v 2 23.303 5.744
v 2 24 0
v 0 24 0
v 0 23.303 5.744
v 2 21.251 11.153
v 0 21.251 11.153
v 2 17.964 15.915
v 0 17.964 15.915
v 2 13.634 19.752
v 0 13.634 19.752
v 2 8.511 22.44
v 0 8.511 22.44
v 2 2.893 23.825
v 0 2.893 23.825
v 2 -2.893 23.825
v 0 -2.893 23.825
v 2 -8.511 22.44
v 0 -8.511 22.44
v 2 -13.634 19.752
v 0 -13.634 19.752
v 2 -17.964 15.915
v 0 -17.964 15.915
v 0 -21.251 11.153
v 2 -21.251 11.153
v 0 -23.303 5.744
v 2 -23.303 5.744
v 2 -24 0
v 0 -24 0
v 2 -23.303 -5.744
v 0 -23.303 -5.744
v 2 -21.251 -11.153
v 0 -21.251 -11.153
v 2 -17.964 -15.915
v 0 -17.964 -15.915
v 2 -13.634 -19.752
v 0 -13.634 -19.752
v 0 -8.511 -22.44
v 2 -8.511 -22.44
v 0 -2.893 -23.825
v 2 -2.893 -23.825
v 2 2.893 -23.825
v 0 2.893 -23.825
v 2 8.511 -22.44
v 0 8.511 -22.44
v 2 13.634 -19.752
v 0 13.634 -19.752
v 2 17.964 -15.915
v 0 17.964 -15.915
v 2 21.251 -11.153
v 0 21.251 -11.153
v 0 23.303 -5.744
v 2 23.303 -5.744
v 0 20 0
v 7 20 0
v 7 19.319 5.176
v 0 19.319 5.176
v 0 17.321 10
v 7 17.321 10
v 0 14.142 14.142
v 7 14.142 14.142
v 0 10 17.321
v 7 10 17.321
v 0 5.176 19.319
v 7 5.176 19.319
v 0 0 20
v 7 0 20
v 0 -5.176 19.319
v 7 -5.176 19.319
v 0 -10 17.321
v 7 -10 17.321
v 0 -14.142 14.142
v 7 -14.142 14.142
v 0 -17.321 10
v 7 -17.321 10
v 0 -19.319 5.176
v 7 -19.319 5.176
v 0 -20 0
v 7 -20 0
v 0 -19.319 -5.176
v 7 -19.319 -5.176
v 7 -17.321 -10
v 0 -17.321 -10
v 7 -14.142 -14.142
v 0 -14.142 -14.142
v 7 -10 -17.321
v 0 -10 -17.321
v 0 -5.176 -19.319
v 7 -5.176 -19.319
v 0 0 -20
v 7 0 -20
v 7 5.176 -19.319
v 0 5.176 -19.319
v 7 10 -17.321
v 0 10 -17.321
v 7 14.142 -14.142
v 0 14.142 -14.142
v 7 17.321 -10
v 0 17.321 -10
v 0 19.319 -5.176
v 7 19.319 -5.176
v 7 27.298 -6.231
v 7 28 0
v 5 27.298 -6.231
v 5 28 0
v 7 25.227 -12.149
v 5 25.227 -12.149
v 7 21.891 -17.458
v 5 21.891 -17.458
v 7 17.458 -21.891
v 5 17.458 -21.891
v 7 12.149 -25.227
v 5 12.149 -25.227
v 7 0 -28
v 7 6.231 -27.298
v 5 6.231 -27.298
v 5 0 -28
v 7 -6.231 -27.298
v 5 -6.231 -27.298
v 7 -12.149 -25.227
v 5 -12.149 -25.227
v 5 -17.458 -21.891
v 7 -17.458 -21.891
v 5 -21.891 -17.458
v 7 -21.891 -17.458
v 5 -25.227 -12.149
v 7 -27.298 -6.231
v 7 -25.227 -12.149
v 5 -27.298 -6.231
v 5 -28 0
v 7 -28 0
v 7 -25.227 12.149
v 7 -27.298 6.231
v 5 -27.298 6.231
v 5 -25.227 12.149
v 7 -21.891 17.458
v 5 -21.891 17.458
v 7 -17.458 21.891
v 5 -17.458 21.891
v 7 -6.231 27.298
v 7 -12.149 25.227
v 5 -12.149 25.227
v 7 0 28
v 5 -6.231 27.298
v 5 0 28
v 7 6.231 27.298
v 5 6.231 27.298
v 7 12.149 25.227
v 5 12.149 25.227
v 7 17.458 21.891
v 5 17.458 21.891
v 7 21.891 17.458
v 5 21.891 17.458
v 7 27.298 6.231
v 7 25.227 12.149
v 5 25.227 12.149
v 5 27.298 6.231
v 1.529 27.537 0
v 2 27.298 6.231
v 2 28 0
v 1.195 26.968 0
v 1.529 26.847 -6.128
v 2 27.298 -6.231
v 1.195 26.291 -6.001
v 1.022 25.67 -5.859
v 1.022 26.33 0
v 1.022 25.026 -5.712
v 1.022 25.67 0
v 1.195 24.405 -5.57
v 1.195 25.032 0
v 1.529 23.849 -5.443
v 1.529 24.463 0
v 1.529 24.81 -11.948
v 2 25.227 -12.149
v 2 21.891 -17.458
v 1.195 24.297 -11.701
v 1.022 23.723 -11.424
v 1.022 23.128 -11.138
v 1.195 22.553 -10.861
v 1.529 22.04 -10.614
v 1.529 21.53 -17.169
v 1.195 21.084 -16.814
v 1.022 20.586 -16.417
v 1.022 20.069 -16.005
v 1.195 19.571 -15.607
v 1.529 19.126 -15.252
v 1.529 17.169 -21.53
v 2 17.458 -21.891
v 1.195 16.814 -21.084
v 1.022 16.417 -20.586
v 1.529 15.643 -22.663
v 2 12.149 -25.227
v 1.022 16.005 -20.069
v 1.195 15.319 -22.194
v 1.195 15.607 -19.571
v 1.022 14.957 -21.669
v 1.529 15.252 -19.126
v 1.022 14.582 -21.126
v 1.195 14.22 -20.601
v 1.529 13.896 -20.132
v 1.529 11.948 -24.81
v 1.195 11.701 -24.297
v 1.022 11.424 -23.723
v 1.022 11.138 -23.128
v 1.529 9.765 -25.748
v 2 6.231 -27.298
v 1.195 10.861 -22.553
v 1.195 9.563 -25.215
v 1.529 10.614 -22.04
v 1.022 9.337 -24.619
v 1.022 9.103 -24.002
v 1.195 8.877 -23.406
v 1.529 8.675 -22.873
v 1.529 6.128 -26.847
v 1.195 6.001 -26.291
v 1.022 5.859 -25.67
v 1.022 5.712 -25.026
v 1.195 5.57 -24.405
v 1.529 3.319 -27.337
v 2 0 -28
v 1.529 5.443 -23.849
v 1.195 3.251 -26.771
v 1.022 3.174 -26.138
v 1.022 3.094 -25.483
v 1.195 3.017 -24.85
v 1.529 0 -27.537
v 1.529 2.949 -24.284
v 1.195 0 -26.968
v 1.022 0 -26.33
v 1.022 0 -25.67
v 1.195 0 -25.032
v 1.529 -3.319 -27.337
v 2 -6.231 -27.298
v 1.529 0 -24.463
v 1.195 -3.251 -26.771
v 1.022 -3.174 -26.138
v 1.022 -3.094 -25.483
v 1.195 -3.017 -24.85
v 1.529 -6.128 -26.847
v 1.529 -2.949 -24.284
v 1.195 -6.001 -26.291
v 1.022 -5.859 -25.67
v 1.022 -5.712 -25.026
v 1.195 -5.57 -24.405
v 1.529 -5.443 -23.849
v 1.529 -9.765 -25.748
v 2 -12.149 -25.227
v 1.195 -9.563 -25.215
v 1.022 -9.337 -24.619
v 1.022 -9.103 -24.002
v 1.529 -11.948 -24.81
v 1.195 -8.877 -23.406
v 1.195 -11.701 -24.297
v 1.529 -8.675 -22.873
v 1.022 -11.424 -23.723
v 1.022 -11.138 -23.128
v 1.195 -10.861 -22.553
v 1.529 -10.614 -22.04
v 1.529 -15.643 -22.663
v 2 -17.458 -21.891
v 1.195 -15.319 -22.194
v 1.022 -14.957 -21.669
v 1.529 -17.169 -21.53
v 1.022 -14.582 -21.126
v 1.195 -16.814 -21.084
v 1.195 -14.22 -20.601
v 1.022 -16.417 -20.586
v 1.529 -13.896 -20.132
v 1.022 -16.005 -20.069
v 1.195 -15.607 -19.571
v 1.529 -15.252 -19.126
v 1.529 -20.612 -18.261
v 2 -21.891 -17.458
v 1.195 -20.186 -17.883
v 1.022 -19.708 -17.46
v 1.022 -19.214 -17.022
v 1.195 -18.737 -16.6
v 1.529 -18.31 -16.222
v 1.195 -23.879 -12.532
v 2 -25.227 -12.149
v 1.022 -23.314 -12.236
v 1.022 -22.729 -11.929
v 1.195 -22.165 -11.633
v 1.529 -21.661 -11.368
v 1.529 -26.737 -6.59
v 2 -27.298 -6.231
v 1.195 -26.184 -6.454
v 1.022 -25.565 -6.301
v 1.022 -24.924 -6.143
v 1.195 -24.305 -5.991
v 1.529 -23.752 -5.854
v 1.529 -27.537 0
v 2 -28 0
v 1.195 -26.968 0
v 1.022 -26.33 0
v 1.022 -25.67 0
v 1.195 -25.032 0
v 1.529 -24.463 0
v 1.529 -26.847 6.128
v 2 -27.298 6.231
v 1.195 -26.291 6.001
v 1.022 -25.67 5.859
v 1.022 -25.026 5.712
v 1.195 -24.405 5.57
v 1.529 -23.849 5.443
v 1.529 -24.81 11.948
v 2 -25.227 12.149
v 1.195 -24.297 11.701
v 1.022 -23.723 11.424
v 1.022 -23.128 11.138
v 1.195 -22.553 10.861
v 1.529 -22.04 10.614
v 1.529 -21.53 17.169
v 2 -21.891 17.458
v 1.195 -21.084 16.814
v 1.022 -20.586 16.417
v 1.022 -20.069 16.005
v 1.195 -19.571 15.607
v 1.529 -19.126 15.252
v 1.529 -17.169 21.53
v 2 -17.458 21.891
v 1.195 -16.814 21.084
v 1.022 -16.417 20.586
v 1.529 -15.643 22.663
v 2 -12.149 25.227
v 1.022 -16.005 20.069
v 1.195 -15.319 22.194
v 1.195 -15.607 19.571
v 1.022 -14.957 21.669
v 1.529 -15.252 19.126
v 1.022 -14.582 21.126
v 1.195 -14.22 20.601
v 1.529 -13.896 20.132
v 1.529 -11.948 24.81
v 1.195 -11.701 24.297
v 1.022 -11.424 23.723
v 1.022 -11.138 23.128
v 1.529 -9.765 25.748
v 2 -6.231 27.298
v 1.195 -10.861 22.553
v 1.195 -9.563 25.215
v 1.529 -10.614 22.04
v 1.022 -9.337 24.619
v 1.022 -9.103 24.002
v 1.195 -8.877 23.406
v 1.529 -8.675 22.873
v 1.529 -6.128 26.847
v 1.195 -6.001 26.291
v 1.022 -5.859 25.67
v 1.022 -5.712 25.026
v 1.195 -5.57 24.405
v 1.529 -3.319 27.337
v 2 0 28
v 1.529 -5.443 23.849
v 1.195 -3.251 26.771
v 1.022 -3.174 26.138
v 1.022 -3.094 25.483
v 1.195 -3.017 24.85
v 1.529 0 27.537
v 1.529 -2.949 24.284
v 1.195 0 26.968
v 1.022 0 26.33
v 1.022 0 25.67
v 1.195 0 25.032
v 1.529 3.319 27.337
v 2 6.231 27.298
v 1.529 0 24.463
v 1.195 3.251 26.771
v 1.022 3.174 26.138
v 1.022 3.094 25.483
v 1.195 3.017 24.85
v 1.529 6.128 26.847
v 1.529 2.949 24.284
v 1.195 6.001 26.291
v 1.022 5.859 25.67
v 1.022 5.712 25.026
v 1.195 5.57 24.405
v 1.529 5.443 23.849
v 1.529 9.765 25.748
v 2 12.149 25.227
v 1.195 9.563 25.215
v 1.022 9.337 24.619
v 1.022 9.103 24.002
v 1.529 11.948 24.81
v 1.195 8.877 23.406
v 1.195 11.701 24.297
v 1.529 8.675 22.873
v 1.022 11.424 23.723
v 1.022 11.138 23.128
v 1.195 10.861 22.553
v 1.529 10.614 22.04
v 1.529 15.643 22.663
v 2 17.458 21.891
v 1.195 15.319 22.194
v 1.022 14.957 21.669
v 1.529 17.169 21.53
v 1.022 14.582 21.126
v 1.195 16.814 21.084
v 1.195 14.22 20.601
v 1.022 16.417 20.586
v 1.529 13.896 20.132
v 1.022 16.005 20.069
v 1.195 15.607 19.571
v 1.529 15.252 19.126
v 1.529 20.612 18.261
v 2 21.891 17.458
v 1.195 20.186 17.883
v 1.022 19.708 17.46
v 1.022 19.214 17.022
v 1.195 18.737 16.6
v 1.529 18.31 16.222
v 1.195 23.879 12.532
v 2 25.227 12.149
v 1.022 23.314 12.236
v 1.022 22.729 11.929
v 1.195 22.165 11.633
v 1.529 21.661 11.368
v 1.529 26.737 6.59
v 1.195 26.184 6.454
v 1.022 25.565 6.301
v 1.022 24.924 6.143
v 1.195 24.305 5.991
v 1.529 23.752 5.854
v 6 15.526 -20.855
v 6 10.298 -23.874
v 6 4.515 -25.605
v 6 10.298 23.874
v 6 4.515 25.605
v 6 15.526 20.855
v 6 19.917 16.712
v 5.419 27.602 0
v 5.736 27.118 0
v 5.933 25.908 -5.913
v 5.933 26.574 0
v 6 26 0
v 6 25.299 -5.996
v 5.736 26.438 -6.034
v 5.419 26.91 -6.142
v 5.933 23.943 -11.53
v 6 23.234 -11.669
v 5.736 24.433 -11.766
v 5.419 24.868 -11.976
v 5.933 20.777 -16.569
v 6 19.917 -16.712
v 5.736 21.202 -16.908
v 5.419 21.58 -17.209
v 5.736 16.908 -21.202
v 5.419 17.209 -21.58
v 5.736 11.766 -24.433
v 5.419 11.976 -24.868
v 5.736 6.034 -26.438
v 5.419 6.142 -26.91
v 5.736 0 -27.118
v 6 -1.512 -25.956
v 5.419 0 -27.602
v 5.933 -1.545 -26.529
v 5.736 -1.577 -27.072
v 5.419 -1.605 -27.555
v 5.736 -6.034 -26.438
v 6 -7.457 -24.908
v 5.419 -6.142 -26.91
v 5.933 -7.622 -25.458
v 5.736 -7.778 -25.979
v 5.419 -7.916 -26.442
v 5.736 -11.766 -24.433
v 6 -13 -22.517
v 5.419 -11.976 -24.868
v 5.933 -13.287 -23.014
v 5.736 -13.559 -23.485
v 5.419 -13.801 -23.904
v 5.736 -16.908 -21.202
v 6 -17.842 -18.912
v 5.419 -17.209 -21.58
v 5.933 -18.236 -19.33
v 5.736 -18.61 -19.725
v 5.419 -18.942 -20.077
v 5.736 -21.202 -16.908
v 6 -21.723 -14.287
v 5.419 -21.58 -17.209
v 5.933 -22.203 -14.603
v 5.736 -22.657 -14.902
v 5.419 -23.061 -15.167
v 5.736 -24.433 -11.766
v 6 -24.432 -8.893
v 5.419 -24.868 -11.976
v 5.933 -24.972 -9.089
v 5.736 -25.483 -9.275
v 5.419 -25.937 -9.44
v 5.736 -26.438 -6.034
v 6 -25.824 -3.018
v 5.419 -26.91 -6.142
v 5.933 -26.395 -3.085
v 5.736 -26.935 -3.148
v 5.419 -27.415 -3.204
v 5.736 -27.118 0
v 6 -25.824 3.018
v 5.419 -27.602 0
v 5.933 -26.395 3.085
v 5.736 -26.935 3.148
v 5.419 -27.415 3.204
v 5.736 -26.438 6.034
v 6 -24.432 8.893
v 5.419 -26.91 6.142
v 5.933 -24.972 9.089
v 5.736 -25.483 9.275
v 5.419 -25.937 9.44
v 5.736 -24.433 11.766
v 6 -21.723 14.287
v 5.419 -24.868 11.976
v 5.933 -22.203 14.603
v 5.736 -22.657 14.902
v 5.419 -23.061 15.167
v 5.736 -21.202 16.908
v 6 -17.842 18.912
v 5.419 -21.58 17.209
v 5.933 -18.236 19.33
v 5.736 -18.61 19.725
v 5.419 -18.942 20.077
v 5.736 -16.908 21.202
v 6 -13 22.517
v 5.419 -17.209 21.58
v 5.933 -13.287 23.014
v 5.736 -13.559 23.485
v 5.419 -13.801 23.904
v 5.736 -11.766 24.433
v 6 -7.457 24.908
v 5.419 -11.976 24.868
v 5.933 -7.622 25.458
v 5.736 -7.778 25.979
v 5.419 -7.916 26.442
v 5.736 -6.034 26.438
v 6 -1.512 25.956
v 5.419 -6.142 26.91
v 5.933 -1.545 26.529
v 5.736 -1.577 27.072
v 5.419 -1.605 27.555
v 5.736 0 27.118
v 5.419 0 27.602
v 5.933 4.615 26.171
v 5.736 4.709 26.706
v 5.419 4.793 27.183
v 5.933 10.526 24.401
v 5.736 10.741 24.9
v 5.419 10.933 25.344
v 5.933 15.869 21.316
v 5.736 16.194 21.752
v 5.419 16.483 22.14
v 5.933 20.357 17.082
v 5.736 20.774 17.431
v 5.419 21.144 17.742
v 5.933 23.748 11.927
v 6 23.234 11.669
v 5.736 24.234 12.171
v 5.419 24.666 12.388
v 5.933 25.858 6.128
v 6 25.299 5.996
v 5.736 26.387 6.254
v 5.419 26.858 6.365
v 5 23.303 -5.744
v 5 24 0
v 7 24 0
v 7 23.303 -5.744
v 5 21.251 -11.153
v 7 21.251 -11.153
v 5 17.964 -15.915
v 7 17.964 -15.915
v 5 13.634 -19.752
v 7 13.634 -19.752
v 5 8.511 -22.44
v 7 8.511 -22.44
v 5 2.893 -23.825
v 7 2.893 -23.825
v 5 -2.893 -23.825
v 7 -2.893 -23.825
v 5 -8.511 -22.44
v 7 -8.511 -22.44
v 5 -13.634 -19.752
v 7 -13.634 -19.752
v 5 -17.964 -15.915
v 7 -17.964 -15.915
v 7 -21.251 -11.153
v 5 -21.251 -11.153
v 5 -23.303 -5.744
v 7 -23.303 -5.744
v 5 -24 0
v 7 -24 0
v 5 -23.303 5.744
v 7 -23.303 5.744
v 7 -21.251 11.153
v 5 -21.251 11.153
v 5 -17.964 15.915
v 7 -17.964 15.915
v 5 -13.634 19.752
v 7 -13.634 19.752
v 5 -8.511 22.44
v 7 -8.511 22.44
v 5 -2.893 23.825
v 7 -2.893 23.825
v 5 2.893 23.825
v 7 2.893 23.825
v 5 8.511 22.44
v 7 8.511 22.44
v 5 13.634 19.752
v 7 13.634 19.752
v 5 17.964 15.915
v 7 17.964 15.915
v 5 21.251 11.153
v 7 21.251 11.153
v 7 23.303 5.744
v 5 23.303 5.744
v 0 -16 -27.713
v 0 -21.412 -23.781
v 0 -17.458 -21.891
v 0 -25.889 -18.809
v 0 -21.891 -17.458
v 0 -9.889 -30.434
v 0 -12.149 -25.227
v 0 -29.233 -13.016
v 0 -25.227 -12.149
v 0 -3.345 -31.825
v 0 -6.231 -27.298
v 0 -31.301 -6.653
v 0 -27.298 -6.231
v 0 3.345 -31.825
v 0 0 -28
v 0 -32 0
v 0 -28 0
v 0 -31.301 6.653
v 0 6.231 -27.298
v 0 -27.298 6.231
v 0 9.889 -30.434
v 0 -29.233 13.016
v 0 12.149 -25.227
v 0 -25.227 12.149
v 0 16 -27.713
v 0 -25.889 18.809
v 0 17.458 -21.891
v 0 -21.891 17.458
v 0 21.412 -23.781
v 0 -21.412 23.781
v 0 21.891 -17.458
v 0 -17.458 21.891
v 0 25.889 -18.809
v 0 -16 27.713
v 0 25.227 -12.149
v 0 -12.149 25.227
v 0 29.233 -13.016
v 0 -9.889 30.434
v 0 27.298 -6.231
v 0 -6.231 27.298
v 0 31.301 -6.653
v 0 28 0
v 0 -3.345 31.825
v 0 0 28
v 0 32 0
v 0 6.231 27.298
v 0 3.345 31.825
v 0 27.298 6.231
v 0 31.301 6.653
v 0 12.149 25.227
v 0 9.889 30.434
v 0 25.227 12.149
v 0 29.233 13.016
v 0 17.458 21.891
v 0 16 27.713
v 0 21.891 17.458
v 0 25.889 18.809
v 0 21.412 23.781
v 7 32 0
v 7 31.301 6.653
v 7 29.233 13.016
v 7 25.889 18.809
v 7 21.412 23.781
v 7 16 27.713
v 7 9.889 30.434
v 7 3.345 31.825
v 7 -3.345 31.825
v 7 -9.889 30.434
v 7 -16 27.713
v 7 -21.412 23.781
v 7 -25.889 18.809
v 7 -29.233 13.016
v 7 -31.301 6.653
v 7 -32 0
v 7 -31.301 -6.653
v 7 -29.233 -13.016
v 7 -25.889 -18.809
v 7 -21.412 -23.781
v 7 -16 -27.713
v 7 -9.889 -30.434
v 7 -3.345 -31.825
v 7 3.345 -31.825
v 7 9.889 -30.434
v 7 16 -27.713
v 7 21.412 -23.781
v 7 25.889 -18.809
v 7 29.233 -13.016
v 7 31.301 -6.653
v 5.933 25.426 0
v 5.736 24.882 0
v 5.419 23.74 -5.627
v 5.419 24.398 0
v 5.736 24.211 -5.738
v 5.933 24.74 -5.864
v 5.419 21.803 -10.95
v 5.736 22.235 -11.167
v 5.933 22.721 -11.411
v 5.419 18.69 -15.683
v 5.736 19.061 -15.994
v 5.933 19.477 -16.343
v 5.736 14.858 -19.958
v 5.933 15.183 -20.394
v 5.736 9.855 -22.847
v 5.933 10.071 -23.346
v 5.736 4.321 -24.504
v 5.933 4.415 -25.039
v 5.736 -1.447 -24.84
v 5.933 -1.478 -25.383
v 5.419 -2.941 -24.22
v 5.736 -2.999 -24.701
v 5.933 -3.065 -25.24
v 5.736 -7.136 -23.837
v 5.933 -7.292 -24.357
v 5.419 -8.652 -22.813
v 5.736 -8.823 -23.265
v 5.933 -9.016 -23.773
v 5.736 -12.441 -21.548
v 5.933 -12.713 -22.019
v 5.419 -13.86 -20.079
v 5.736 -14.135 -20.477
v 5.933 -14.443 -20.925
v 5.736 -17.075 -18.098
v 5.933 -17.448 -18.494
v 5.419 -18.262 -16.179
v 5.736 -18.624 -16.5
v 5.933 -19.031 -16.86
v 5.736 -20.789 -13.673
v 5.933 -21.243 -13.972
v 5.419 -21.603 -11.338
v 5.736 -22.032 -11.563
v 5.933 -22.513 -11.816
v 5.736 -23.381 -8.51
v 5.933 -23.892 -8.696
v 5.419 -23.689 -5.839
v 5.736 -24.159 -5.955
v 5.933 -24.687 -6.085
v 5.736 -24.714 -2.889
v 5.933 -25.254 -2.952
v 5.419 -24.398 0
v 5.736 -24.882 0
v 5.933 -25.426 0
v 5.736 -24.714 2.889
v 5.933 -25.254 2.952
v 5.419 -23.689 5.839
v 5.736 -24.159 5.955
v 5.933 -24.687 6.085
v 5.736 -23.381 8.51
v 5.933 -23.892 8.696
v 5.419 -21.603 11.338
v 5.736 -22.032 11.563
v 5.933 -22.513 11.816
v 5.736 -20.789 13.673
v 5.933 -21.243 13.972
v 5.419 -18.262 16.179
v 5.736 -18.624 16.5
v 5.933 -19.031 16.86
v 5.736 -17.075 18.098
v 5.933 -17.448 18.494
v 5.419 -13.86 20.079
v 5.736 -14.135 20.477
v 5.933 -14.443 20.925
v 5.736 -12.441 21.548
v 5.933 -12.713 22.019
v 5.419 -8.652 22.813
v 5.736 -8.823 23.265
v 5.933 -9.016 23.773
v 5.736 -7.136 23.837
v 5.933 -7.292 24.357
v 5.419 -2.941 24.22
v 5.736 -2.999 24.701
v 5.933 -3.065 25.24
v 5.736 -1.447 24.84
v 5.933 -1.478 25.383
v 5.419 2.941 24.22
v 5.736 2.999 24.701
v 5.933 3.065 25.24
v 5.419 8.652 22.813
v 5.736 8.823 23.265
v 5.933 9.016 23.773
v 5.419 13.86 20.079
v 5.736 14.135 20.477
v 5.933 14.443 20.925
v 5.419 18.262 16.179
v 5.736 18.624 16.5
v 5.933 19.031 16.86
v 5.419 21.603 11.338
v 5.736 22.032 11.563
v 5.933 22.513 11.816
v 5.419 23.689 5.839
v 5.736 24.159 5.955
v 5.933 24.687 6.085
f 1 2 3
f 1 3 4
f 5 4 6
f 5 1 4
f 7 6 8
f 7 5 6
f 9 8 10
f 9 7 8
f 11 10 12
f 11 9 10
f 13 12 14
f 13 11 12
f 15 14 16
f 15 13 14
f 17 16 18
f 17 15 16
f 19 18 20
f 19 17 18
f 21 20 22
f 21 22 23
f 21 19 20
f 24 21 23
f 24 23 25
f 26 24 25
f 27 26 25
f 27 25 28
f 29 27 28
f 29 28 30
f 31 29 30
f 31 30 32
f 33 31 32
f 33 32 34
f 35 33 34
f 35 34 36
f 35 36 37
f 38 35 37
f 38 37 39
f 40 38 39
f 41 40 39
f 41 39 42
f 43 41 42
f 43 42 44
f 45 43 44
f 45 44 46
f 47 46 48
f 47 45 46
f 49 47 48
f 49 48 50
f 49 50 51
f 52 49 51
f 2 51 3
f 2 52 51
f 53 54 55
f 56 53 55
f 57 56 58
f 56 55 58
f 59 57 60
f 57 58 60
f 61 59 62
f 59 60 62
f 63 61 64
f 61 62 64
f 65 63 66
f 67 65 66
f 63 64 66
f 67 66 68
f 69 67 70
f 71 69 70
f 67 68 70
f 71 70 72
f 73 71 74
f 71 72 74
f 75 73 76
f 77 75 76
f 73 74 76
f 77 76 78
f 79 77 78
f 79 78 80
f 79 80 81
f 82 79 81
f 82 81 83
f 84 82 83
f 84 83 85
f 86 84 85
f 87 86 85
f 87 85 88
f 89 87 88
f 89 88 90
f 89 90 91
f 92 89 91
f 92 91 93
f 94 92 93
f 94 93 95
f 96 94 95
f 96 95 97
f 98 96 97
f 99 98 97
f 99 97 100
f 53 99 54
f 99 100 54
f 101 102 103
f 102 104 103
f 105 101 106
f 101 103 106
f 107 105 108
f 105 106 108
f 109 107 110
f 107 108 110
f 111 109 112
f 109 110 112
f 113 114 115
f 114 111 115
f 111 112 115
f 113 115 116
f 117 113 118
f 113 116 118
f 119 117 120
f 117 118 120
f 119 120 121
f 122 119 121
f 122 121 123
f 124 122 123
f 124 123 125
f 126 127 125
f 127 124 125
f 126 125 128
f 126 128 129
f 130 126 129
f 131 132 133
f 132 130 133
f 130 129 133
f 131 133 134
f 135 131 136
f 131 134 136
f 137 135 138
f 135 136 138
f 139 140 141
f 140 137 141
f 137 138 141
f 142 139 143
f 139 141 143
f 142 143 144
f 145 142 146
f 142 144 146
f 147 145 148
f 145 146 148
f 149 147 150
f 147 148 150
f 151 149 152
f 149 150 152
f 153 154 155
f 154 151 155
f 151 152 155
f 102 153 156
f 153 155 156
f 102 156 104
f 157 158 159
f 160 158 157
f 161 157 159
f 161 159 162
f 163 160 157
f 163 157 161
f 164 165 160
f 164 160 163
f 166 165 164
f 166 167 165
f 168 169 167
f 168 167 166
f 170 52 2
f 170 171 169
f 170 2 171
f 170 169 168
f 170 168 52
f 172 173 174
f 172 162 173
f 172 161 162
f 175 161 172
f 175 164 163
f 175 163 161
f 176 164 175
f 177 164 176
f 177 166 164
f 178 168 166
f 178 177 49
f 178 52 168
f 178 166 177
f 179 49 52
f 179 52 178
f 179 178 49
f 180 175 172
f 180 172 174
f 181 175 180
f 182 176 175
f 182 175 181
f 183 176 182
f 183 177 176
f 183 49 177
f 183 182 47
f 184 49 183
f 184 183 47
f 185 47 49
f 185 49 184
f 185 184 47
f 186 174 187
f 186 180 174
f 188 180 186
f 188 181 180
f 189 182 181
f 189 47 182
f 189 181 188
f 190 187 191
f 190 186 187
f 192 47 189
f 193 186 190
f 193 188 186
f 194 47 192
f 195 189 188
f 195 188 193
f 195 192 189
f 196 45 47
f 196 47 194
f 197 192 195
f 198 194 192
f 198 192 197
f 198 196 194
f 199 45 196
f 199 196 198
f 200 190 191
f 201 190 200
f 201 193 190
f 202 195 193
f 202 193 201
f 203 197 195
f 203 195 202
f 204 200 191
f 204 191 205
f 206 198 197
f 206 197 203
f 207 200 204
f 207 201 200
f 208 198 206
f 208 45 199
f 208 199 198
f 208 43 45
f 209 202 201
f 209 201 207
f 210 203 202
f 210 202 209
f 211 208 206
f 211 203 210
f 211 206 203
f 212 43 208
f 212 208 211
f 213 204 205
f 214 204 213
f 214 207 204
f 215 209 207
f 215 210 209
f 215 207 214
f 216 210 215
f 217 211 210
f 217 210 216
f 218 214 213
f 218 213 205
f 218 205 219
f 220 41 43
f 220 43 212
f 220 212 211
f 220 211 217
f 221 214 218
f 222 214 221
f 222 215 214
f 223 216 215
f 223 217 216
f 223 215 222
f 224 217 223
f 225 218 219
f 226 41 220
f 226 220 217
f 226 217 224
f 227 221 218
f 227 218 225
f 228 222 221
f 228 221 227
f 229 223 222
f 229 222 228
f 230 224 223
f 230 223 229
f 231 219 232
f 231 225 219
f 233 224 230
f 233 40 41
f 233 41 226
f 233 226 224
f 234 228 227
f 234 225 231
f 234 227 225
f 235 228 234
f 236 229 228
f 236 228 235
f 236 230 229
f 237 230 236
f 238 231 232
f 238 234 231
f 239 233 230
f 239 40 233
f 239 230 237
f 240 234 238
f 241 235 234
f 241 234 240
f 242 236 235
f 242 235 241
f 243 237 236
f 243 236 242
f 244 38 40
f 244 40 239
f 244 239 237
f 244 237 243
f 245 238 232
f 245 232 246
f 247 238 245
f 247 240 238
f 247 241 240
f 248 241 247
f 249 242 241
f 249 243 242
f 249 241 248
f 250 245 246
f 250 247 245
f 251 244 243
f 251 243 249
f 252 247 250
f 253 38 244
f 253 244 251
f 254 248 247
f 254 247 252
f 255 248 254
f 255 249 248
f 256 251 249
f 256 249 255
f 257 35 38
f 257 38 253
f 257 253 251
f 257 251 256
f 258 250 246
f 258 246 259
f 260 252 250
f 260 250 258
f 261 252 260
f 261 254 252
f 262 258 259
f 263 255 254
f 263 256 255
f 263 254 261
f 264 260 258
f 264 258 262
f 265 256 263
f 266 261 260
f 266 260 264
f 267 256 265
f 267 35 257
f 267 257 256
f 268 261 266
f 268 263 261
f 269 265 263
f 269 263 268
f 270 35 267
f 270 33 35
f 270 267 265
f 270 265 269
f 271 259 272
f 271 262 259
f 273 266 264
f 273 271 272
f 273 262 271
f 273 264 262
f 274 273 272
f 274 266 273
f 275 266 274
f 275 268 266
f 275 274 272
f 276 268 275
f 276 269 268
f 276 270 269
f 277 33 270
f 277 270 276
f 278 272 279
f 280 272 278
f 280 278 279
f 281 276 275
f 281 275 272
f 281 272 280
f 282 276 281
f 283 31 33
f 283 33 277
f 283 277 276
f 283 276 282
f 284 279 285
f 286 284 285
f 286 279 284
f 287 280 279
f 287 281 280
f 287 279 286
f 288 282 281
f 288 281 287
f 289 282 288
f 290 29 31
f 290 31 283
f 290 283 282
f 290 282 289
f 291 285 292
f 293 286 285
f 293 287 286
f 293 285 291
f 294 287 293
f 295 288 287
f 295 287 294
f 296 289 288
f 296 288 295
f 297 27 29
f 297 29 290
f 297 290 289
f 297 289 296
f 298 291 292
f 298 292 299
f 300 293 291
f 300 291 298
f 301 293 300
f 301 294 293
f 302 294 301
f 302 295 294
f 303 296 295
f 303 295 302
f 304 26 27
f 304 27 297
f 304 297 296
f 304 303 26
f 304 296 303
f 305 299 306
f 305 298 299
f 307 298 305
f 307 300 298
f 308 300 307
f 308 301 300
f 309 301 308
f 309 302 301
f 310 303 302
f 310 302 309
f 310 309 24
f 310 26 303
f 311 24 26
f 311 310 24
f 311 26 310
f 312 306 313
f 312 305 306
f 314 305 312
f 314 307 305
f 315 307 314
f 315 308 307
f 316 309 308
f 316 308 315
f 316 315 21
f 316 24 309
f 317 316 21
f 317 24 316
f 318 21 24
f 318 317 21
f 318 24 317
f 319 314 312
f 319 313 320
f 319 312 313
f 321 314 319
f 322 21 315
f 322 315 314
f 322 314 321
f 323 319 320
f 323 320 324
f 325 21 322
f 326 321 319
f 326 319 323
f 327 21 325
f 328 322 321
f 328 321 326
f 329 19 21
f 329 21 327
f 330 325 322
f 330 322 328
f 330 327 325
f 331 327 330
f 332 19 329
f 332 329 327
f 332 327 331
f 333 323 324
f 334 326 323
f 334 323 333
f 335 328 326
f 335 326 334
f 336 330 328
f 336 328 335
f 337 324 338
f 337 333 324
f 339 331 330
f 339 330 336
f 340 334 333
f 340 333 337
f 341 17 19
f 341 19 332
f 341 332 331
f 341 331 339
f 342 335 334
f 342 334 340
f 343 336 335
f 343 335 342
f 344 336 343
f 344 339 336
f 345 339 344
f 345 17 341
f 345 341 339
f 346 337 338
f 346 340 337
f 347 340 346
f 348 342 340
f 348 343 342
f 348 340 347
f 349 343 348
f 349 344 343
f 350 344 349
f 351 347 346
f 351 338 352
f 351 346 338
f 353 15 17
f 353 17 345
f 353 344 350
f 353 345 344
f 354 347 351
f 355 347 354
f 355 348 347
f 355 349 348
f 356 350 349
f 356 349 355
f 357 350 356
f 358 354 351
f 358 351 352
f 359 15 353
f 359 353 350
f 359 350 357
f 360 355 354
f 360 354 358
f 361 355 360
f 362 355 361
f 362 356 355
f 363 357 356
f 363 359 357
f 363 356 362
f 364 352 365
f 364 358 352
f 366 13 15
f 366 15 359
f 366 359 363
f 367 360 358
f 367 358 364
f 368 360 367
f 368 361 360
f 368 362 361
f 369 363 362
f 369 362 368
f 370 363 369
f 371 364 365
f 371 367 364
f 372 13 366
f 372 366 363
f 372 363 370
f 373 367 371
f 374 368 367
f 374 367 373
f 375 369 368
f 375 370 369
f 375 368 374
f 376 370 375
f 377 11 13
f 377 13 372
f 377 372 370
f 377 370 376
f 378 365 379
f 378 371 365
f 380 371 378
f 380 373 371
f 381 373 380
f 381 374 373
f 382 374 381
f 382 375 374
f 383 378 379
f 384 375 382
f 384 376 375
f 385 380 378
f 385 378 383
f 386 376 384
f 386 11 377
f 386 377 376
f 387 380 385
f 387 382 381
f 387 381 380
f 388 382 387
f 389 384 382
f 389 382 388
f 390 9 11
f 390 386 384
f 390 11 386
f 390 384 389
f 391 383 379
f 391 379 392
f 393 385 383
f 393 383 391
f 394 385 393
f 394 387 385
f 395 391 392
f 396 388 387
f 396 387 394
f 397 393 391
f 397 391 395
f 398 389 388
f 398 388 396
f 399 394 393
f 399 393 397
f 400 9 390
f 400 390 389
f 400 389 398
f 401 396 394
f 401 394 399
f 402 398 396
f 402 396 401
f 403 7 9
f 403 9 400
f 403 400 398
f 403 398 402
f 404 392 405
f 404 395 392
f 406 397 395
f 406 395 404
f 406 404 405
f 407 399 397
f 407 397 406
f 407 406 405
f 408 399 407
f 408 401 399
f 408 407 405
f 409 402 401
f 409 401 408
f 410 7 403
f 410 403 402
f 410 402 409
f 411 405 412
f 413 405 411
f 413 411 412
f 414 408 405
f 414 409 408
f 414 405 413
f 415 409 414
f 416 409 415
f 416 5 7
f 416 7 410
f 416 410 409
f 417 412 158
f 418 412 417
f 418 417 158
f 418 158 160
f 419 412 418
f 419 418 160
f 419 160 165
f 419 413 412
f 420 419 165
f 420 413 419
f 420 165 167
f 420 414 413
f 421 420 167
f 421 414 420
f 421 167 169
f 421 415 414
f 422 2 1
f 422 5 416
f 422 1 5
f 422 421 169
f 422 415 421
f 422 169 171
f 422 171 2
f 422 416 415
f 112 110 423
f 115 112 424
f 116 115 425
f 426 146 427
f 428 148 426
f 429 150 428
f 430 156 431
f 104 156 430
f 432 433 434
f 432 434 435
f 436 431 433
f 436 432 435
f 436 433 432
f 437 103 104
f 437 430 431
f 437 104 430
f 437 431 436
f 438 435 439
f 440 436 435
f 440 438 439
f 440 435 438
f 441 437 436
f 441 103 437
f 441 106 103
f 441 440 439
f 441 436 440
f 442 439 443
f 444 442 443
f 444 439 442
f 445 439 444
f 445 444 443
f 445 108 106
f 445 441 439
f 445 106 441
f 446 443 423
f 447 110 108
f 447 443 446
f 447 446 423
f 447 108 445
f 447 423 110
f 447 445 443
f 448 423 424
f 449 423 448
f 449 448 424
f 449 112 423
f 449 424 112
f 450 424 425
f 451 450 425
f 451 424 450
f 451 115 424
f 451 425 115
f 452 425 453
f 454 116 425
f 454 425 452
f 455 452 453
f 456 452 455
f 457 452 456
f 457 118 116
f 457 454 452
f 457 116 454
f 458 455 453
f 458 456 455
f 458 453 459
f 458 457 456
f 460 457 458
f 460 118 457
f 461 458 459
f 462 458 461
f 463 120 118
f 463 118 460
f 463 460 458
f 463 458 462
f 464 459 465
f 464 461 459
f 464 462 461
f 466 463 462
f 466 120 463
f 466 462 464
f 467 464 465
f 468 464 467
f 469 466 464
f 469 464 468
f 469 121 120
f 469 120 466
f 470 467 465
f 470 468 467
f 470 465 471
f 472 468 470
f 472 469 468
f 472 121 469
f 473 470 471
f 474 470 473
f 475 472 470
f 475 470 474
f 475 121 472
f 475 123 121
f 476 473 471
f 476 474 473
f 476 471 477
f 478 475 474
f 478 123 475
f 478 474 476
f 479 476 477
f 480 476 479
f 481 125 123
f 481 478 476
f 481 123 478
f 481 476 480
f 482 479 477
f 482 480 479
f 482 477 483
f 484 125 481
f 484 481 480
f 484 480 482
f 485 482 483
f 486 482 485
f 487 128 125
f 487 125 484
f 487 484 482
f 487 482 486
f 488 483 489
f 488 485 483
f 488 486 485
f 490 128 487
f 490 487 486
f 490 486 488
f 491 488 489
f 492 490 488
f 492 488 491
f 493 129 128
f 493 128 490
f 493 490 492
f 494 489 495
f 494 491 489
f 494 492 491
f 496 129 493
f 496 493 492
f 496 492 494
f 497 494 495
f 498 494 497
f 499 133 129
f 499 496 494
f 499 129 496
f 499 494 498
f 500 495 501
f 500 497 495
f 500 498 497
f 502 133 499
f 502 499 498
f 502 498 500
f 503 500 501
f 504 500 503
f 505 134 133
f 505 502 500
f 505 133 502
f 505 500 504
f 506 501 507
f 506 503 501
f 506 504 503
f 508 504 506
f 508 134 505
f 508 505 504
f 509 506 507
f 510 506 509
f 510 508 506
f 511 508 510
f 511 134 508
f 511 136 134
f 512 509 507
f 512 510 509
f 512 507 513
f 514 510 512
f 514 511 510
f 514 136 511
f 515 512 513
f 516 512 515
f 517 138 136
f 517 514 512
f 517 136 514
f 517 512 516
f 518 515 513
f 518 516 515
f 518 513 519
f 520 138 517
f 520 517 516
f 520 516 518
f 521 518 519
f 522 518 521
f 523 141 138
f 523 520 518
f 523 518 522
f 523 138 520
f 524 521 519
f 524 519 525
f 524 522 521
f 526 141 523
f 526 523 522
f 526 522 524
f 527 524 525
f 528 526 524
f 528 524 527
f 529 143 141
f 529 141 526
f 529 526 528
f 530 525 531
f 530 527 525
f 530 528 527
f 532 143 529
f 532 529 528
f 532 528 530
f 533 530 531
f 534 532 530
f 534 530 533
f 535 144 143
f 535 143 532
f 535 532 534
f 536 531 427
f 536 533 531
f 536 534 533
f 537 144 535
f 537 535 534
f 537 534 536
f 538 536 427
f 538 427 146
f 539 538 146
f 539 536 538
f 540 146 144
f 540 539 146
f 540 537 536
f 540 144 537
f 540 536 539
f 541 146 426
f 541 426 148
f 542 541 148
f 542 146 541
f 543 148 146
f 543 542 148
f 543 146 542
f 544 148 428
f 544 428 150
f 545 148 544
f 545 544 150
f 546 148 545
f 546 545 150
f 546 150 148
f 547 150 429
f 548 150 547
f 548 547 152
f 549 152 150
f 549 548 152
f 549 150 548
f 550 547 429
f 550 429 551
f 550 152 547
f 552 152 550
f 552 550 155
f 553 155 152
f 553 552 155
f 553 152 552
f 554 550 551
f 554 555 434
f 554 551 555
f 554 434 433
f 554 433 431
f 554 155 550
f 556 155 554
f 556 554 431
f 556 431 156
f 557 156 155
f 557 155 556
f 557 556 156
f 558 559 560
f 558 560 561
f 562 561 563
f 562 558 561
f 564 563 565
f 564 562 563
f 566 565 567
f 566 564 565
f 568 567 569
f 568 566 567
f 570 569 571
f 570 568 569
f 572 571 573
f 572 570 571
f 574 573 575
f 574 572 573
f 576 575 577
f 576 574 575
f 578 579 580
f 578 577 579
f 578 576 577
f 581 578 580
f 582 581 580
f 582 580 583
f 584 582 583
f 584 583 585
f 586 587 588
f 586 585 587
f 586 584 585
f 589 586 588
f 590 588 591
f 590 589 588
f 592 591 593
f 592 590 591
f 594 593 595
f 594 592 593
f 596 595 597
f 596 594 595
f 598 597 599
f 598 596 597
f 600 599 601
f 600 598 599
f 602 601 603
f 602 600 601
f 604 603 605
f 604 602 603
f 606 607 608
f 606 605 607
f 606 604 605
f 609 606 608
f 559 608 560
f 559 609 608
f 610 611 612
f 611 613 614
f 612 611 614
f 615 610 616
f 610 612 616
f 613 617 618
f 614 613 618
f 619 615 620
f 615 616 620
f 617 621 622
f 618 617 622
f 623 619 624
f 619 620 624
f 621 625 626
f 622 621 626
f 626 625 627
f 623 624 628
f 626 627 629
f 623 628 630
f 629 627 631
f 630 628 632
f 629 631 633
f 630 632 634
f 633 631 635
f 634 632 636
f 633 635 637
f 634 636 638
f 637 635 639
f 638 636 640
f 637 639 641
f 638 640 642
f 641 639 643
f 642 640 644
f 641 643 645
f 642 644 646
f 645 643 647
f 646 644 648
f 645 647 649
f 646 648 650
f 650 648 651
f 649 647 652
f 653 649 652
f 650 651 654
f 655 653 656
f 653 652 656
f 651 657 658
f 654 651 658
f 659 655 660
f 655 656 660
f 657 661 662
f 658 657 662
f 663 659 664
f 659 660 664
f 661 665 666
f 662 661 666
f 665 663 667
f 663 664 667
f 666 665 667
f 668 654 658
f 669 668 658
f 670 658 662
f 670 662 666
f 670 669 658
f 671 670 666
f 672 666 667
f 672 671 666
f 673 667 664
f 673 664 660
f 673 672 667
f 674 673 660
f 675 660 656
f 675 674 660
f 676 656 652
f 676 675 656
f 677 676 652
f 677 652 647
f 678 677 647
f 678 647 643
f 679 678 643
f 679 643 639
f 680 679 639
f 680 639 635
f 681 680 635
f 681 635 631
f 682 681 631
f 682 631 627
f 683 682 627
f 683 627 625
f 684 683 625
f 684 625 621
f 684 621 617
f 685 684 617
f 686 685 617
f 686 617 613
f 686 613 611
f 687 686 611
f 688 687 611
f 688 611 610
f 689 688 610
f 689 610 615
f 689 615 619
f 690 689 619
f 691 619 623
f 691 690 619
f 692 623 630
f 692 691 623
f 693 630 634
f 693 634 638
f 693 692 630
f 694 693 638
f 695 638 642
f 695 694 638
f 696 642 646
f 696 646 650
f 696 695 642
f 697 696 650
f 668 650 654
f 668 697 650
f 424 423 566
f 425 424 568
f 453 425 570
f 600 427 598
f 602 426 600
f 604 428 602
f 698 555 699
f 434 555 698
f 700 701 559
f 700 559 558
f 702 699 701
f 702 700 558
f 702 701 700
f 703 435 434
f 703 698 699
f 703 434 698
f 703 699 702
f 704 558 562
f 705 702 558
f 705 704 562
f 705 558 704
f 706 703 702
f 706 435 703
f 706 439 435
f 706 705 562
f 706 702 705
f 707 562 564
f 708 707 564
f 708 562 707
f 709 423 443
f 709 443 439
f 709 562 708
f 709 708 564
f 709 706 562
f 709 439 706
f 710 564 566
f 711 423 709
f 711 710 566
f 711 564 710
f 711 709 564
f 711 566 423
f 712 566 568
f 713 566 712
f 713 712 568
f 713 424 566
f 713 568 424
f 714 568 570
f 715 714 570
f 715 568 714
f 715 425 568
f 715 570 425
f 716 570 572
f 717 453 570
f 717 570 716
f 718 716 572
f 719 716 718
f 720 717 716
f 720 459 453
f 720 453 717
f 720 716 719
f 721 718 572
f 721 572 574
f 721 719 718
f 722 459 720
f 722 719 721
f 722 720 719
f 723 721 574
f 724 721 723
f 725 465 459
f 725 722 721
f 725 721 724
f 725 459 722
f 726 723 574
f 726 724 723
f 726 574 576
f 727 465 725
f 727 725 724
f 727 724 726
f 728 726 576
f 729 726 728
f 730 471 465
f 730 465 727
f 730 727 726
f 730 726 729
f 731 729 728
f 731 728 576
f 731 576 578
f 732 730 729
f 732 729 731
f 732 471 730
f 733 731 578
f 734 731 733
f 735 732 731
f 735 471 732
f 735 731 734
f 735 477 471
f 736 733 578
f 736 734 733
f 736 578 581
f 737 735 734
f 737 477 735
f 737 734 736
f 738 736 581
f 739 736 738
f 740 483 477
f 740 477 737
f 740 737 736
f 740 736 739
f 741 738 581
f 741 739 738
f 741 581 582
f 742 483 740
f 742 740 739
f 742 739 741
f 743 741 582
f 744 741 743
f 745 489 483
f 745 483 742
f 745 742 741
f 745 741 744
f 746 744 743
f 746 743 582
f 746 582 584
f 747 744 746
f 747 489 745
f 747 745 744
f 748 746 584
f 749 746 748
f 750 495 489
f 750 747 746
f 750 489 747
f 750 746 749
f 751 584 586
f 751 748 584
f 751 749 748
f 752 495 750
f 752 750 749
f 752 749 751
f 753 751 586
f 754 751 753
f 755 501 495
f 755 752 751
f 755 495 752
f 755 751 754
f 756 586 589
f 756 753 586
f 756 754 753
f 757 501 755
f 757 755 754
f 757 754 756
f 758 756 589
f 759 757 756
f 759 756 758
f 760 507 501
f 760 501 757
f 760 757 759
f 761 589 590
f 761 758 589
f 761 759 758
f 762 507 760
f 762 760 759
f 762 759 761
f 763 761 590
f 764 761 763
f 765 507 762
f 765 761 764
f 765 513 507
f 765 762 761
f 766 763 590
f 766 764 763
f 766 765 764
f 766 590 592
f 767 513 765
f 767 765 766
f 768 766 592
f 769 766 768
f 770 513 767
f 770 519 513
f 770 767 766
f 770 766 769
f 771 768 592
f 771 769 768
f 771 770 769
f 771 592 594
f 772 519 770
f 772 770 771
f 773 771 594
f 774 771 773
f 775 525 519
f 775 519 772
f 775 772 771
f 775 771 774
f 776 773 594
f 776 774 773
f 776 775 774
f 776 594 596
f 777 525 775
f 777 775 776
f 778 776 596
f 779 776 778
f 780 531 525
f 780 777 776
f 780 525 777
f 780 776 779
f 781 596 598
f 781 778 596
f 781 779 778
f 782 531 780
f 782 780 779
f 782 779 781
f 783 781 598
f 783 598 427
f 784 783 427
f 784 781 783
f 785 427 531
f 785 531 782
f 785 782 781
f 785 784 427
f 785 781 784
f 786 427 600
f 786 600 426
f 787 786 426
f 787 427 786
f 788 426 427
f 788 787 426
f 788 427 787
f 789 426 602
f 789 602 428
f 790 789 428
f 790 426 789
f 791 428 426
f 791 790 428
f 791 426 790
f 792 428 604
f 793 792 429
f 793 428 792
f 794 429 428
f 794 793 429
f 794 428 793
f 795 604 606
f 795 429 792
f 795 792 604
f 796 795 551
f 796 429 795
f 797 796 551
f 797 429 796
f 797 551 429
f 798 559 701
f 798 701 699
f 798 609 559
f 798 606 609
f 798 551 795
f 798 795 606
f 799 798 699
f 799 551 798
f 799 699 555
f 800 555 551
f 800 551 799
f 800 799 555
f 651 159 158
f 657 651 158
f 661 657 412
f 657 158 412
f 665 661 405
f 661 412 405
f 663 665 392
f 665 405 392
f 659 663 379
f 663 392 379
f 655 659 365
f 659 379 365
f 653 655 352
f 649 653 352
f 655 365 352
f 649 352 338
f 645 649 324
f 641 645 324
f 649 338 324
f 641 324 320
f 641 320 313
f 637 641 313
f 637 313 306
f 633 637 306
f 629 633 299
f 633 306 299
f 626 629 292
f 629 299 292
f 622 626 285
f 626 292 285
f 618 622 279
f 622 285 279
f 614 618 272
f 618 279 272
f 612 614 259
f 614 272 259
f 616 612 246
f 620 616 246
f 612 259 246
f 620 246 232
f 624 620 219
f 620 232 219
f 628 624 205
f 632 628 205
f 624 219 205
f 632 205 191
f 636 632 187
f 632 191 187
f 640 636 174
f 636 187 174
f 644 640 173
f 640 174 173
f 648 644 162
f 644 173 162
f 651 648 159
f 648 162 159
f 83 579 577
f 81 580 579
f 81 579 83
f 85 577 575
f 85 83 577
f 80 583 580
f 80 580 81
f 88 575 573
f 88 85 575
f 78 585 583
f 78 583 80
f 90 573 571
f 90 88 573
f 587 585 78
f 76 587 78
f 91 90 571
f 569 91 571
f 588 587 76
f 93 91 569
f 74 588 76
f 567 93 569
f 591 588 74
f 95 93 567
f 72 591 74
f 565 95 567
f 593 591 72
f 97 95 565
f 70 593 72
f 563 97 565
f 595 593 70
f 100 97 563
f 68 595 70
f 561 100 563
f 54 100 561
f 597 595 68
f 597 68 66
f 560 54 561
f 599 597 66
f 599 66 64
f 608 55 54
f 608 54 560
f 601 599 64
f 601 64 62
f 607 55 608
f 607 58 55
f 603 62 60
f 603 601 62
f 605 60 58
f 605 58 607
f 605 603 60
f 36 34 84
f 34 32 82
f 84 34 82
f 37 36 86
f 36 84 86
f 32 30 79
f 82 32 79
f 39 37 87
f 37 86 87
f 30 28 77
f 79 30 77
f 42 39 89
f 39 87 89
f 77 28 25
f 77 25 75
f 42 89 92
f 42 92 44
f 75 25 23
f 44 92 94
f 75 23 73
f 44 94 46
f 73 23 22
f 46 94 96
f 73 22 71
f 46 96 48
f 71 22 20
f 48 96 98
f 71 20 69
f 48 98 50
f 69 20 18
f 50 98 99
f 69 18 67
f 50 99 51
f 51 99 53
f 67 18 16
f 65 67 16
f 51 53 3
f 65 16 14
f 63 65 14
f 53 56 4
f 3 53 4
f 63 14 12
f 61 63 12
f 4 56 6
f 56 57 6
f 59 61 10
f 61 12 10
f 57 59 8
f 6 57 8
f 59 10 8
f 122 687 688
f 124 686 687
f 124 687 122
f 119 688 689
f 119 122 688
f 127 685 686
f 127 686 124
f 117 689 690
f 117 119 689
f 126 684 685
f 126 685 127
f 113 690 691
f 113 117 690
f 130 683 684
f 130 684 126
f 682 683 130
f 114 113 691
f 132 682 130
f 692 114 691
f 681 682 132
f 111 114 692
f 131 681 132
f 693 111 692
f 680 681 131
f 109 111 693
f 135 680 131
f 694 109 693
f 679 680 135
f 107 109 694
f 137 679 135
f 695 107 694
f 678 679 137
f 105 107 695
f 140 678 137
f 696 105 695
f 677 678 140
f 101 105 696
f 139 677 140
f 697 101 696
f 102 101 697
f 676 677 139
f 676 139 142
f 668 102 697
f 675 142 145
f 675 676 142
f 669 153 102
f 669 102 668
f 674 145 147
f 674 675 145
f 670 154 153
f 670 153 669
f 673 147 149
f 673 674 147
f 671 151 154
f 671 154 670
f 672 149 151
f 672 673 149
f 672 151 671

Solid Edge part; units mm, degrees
sketch "Sketch1" plane through (0, 0, 0) normal (0, 0, 1) x (1, 0, 0)
  line L0 (0, 32) -> (7, 32)
  line L1 (7, 32) -> (7, 28)
  line L2 (7, 28) -> (5, 28)
  line L3 (2, 28) -> (5, 28)
  line L4 (0, 28) -> (2, 28)
  line L5 (0, 32) -> (0, 28)
  line L6 (0, 20) -> (7, 20)
  line L7 (7, 20) -> (7, 24)
  line L8 (7, 24) -> (5, 24)
  line L9 (2, 24) -> (5, 24)
  line L10 (0, 24) -> (2, 24)
  line L11 (0, 20) -> (0, 24)
  circle A0 centre (3.5, 26) radius 2.5
  dimension "D1" = 4
  dimension "D2" = 7
  dimension "D3" = 4
  dimension "D4" = 7
  dimension "D5" = 20
  dimension "D6" = 2
  dimension "D7" = 2
  dimension "D8" = 4
  dimension "D9" = 4
  dimension "D10" = 2
  dimension "D11" = 2
revolve "RevolvedProtrusion1" add sketch "Sketch1" angle 360 about axis through (0, 0, 0) along (1, 0, 0)
properties material "Aluminum, 6061-T6"
